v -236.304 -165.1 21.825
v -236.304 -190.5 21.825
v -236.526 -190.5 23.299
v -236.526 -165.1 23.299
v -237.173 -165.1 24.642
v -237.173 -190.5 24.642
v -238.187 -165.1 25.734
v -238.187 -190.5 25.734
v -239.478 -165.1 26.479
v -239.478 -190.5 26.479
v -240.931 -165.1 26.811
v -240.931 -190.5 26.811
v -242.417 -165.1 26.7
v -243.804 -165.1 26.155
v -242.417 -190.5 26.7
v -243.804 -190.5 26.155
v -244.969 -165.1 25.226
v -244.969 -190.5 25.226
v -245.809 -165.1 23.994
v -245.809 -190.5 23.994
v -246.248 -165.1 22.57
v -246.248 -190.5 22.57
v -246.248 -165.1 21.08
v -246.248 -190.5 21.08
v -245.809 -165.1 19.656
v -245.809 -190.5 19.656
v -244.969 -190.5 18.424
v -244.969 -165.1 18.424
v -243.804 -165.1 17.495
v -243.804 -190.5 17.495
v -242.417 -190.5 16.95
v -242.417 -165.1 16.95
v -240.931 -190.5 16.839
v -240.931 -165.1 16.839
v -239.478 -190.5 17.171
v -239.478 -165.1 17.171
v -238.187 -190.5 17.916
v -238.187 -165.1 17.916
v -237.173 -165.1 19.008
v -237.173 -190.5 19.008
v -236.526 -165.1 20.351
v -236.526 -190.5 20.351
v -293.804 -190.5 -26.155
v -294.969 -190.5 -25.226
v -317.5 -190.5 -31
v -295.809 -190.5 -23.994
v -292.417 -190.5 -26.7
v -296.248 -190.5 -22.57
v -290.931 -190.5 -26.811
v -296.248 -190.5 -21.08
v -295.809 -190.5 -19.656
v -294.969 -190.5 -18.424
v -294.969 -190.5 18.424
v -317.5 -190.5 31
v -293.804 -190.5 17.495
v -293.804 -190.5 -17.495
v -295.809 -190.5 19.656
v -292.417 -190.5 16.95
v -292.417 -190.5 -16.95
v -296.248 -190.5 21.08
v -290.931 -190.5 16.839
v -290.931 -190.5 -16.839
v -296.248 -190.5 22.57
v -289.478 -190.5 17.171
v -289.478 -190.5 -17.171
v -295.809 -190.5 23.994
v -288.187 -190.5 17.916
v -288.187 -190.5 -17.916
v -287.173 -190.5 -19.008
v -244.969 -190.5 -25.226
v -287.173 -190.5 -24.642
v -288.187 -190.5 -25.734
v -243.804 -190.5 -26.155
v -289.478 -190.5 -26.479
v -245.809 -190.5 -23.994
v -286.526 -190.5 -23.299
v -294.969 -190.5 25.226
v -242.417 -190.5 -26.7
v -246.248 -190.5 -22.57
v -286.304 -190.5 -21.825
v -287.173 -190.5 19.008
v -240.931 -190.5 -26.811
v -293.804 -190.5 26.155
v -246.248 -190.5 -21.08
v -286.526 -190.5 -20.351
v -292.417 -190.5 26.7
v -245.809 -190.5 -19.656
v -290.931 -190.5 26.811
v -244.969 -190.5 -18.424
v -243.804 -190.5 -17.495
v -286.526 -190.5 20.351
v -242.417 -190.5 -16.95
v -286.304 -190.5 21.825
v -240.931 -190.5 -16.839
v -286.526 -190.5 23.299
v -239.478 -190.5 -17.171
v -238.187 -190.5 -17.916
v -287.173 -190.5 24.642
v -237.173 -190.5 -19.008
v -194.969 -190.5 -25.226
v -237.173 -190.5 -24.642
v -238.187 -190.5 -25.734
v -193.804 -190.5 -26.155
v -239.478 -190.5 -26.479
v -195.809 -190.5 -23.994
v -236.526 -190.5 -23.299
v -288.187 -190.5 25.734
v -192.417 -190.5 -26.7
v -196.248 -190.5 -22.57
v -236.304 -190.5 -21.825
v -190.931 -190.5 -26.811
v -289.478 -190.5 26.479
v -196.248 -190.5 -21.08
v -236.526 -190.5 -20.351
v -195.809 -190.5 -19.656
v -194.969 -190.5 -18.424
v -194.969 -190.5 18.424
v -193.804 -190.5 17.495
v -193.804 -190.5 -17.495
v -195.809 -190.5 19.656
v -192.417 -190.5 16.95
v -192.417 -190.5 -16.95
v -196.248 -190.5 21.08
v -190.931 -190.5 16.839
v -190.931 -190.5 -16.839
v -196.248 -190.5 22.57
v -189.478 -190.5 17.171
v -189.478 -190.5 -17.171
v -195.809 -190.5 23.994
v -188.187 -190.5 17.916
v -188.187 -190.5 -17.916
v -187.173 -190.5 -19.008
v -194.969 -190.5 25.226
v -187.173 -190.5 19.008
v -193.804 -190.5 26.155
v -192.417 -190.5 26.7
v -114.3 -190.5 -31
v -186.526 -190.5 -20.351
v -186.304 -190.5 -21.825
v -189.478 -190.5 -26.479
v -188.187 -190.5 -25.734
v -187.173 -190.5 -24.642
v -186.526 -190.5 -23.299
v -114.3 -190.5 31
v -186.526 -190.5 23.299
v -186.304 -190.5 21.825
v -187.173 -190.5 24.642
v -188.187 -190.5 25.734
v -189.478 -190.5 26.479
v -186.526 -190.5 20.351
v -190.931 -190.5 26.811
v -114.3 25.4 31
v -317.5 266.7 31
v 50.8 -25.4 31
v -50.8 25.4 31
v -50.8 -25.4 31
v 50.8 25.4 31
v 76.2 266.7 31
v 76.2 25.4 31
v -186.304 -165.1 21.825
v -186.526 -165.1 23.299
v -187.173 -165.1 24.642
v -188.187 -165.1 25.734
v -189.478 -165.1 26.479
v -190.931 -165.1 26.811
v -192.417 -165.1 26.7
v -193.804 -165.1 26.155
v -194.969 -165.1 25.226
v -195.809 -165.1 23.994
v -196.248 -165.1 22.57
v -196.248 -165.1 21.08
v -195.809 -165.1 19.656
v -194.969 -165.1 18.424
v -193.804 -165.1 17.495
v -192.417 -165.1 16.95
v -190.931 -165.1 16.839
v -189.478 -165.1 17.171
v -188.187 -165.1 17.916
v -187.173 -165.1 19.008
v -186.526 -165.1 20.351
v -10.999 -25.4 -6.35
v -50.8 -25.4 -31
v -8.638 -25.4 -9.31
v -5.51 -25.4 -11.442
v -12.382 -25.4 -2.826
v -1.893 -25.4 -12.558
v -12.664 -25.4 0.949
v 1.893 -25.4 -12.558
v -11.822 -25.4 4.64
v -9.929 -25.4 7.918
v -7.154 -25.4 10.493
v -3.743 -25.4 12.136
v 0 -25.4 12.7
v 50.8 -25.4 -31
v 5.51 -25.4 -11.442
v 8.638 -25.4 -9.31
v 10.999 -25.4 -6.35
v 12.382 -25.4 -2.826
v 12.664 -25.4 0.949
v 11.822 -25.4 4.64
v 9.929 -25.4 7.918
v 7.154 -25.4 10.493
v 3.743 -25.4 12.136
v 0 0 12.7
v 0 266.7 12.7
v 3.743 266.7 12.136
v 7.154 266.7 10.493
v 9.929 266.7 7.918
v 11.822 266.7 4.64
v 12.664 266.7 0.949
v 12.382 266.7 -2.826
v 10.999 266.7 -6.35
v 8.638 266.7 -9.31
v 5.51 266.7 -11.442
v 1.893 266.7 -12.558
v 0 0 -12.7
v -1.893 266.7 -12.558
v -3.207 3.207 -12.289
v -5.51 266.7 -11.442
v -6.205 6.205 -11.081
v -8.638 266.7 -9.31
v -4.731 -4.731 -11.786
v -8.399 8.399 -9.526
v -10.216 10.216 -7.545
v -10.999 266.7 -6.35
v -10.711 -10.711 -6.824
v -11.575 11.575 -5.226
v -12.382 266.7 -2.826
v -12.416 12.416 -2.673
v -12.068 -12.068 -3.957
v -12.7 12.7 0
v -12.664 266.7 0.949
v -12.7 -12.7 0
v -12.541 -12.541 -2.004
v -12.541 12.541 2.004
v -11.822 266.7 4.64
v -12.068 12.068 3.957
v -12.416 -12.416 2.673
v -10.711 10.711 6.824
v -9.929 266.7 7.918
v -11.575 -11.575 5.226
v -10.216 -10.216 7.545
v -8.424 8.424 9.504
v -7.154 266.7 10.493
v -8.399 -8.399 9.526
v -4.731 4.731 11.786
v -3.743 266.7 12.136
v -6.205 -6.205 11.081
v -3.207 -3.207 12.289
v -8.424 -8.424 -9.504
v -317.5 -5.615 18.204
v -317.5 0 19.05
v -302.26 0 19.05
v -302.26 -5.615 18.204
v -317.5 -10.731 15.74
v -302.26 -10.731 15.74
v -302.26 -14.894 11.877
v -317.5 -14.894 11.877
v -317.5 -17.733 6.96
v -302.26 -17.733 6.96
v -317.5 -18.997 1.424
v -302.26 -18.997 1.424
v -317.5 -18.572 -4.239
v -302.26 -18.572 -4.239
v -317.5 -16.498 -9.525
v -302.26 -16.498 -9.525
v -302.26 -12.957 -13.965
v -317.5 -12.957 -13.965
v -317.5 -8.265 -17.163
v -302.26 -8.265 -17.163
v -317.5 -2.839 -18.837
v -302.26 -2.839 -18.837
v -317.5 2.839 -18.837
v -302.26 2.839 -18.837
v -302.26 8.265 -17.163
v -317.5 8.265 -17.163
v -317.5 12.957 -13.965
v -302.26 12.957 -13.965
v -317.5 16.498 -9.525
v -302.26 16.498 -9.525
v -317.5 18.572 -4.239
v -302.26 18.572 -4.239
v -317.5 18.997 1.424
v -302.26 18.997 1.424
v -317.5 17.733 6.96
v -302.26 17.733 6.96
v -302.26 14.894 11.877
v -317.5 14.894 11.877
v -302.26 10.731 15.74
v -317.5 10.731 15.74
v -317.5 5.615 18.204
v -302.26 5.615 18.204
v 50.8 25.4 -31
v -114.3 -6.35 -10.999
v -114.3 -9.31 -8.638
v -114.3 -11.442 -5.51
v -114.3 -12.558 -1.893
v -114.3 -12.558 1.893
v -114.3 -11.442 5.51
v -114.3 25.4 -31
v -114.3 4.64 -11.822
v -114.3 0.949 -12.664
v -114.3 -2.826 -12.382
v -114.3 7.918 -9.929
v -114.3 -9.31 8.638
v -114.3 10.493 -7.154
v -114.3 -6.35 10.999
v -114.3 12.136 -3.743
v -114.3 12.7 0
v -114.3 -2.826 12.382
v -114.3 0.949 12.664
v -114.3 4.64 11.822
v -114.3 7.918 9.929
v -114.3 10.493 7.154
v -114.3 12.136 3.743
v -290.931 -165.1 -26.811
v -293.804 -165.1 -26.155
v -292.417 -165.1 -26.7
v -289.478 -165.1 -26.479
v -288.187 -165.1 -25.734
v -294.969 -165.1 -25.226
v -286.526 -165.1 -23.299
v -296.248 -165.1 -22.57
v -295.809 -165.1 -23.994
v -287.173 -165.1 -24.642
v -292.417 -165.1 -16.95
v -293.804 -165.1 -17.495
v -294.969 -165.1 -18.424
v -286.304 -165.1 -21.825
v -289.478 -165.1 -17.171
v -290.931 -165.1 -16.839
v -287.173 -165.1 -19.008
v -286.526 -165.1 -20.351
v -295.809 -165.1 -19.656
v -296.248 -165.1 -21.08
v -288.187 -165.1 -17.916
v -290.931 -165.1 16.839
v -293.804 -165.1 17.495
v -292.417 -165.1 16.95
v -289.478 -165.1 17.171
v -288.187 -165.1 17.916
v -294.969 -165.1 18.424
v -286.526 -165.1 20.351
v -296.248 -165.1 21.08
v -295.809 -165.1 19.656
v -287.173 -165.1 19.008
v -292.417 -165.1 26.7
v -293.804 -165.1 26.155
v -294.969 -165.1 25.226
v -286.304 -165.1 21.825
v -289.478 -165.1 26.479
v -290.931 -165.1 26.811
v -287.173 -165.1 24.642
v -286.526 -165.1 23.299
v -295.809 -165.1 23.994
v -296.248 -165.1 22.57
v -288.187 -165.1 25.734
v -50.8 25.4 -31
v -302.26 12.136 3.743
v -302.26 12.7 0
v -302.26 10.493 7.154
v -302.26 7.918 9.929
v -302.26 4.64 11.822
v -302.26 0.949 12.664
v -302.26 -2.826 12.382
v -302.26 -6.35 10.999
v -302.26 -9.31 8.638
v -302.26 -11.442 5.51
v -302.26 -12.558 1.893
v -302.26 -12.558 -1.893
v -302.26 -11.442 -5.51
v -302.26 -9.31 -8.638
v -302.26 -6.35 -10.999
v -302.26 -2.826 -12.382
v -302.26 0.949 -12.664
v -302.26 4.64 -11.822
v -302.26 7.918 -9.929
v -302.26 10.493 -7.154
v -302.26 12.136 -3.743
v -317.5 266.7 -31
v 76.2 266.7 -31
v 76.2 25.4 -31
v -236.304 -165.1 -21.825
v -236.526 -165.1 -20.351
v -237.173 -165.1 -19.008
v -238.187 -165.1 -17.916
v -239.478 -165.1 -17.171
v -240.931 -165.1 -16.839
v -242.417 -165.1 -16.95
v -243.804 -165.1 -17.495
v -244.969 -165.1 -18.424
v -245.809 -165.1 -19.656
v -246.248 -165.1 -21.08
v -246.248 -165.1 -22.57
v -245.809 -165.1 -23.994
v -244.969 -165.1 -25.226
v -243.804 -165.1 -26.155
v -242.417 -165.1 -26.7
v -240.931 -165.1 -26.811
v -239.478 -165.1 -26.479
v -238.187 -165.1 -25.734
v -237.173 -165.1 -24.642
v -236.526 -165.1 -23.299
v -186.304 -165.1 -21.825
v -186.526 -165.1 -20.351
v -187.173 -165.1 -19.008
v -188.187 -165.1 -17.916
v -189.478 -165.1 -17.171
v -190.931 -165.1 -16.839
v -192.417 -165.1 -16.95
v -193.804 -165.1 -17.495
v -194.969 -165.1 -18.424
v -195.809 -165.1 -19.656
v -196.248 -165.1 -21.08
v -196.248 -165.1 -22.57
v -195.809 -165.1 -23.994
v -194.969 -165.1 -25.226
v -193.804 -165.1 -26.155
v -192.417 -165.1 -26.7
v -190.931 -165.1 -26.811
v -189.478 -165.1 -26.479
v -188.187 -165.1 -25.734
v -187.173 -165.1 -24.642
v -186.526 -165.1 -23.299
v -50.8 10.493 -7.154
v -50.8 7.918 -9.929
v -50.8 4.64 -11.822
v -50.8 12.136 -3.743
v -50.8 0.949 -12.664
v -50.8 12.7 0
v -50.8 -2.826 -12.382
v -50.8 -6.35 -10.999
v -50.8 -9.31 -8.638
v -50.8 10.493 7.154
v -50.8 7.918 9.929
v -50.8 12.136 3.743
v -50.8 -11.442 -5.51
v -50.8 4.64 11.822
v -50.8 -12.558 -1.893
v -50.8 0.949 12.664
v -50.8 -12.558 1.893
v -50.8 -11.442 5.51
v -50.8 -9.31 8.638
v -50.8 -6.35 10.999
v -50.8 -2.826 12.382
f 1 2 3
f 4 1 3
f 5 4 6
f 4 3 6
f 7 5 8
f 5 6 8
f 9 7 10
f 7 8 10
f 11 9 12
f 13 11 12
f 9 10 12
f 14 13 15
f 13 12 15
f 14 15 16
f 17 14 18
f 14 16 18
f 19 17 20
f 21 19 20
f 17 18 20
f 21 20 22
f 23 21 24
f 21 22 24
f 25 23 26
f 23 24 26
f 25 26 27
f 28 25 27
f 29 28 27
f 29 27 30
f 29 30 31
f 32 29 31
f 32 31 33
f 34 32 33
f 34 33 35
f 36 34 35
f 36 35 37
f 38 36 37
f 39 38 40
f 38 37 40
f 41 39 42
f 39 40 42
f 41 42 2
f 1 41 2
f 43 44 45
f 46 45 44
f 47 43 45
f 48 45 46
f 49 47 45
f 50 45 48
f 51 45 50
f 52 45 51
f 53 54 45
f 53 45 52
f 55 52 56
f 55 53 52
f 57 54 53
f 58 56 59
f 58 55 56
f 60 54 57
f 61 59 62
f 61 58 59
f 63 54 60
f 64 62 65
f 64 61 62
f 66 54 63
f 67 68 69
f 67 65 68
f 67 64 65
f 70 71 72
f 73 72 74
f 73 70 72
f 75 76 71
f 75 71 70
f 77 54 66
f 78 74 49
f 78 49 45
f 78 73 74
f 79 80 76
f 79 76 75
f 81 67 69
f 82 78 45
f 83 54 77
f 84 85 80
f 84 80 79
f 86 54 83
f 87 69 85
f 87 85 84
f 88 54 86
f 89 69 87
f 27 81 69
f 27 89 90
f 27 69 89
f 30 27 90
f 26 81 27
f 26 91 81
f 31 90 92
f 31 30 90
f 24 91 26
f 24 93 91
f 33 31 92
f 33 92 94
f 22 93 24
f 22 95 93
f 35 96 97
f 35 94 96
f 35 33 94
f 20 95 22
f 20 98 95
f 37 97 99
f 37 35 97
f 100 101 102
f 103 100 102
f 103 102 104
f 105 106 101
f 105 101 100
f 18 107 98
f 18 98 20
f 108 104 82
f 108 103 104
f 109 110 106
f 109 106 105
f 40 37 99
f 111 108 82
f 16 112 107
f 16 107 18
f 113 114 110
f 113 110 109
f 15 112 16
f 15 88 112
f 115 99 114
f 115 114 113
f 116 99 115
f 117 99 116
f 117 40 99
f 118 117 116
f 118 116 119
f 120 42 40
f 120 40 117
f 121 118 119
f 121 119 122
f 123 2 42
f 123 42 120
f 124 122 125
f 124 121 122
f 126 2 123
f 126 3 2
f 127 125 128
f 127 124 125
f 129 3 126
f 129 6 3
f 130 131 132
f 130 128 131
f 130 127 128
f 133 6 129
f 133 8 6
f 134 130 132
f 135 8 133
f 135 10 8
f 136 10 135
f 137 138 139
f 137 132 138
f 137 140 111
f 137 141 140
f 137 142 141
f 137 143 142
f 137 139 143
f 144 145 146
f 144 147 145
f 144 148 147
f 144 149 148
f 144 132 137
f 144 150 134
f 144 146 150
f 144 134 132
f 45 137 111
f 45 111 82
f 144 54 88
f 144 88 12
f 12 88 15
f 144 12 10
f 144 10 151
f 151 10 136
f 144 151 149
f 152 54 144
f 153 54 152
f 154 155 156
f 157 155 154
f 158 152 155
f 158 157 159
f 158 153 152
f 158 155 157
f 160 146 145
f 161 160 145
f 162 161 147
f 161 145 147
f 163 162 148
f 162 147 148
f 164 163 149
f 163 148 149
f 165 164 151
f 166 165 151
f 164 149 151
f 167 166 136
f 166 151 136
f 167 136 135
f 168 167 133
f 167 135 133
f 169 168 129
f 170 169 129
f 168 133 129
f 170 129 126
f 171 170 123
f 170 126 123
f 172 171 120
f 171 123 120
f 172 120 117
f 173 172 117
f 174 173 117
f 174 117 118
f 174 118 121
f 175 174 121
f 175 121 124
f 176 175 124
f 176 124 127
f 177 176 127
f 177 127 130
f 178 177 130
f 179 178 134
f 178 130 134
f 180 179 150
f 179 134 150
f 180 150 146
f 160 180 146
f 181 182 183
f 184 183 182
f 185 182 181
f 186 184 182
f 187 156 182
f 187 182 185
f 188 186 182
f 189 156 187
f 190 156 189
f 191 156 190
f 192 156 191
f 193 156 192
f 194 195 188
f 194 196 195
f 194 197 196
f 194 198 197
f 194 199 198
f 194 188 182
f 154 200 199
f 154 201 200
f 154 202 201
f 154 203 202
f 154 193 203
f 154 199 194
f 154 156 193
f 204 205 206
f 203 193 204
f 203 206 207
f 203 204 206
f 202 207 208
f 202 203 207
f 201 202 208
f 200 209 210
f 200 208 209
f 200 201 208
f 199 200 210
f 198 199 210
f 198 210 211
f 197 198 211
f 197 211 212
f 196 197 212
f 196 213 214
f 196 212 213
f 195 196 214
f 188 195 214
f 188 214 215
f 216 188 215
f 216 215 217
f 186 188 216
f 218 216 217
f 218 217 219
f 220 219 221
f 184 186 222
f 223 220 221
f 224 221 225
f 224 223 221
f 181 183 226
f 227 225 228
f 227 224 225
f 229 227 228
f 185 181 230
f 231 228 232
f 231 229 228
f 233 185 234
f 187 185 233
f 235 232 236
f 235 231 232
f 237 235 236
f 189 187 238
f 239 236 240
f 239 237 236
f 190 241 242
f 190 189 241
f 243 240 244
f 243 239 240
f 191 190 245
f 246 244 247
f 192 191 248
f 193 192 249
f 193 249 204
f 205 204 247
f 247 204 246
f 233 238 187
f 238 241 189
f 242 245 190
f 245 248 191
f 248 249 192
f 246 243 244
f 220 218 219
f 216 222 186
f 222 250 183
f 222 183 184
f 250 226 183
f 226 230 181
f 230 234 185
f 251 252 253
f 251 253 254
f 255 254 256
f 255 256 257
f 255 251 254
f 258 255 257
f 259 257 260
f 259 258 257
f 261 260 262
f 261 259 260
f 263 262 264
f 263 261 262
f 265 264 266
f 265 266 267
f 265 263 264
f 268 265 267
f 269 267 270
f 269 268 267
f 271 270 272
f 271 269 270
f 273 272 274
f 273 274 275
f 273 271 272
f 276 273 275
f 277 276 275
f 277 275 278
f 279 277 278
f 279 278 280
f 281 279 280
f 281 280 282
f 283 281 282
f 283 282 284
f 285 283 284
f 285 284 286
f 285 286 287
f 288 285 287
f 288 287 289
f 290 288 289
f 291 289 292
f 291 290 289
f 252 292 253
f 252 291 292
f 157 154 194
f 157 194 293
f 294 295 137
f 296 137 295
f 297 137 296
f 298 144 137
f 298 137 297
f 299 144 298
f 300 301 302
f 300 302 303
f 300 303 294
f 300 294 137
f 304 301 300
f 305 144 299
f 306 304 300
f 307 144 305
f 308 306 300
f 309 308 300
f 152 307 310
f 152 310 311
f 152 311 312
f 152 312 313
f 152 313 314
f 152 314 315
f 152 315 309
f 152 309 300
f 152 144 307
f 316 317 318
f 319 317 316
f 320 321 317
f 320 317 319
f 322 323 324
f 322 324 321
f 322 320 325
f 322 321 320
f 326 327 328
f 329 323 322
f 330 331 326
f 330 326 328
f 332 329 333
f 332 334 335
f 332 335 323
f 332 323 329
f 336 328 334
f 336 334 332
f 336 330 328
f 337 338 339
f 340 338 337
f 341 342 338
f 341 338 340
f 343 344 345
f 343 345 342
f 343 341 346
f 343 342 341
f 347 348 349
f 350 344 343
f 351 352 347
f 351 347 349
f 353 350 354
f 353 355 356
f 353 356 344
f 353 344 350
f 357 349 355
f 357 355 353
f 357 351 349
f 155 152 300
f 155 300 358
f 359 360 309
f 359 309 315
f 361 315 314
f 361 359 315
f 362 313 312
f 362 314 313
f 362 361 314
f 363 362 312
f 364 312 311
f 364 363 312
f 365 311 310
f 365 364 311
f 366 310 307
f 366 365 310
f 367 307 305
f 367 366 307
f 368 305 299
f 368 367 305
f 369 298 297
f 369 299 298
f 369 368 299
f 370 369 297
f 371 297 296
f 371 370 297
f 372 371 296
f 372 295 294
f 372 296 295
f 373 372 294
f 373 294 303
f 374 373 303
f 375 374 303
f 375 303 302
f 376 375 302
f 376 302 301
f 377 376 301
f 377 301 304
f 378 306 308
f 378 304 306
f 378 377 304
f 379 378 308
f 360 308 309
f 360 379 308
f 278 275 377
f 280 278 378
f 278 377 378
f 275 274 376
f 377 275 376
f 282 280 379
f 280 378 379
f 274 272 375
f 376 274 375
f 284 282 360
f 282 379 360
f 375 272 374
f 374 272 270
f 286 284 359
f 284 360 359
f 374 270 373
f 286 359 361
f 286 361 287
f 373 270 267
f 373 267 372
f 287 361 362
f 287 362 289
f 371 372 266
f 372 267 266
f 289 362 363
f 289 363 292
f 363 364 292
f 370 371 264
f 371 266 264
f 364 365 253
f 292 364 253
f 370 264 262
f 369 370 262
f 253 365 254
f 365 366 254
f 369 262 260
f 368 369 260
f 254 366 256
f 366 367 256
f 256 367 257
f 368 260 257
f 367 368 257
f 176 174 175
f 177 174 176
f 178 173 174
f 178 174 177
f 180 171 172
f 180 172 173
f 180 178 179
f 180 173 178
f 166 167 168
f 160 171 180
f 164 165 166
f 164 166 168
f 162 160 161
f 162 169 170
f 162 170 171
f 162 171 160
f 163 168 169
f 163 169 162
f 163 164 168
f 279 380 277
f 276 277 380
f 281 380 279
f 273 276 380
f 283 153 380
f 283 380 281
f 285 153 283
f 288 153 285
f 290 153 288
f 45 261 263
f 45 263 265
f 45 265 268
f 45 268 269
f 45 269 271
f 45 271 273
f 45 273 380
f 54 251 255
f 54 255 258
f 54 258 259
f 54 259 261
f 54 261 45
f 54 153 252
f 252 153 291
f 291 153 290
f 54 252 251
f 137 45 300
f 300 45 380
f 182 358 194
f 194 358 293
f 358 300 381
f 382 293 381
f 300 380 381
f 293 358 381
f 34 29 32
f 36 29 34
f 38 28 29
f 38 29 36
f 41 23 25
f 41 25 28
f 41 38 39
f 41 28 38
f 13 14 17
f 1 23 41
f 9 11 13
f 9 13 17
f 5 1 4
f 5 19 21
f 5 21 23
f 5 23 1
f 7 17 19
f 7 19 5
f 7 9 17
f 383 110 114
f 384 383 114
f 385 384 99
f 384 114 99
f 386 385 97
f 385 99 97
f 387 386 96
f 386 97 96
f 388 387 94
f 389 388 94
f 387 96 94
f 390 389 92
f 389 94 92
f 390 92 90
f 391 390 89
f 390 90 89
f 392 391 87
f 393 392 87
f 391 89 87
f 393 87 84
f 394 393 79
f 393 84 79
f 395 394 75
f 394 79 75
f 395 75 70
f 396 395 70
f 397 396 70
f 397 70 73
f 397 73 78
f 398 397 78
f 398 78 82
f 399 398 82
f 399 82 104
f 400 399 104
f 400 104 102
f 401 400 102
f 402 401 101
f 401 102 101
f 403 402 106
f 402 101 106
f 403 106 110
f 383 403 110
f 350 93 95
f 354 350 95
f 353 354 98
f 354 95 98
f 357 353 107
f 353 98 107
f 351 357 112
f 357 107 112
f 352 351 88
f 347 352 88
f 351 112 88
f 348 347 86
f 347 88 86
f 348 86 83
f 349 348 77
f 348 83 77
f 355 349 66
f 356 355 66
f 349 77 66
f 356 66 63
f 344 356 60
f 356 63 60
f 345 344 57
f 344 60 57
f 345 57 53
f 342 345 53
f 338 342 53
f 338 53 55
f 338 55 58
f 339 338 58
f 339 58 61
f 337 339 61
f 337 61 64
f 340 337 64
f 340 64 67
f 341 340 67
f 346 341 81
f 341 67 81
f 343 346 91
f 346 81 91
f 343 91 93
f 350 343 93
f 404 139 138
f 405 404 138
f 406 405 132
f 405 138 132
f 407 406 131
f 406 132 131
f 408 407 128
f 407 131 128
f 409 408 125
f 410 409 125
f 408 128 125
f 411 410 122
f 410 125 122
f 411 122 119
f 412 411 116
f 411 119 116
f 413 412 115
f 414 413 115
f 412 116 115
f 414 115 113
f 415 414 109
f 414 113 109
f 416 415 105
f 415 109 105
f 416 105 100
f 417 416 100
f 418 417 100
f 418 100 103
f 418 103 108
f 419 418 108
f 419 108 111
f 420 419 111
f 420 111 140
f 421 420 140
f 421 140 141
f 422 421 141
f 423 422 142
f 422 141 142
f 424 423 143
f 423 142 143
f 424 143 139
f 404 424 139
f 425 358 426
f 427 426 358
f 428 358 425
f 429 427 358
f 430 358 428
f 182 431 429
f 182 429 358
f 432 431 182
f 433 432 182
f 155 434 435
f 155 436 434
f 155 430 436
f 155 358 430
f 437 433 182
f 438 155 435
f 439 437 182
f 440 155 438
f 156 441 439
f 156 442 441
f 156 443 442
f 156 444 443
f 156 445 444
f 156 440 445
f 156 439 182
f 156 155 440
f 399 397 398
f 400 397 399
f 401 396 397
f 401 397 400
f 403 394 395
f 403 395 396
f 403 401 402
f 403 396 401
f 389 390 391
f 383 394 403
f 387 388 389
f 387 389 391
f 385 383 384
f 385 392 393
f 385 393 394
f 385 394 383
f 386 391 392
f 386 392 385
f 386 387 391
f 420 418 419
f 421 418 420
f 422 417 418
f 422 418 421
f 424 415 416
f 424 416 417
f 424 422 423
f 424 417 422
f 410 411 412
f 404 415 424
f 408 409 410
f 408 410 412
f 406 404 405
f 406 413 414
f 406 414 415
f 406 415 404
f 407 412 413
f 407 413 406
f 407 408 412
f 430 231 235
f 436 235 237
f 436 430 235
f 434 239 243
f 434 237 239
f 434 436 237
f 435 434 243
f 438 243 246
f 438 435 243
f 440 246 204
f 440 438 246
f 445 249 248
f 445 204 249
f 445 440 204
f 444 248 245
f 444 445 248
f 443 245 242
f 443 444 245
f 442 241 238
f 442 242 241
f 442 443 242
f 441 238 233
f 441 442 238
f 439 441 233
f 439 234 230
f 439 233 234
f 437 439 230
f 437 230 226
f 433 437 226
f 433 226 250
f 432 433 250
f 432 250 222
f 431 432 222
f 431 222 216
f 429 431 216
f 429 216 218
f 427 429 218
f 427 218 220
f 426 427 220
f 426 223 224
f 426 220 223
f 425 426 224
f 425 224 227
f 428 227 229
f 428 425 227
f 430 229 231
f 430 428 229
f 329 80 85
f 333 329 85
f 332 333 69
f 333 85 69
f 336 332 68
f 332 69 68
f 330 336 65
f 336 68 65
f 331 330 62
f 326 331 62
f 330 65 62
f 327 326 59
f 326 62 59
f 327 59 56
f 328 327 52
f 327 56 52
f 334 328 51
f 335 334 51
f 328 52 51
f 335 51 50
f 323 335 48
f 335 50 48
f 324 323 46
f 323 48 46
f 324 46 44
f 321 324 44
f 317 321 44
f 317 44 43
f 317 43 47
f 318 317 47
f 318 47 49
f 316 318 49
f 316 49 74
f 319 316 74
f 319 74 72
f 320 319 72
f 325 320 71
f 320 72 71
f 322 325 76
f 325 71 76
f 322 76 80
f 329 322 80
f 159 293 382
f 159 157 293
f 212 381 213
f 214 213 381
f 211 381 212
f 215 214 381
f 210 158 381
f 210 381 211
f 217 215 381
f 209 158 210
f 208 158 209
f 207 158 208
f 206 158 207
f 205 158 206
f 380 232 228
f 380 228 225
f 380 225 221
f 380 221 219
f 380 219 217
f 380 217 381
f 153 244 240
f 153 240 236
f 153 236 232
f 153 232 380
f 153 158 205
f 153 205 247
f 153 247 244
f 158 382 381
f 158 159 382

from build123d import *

# Parameters (mm, degrees)
BOSS_EXTRUDE3_DEPTH     = 31
SKETCH2_R               = 12.7
CUT_EXTRUDE1_DEPTH      = 317.5
CUT_EXTRUDE3_DEPTH      = 416.807816184
CUT_EXTRUDE3_DEPTH_BACK = 416.807816184
SKETCH6_R               = 12.7
SKETCH3_R               = 19.05
CUT_EXTRUDE4_DEPTH      = 15.24
SKETCH7_R               = 5
CUT_EXTRUDE5_DEPTH      = 25.4


with BuildPart() as part:
    # Sketch5 → Boss-Extrude3 (new, symmetric)
    with BuildSketch(Plane.XY):
        Polygon((76.2, 266.7), (-317.5, 266.7), (-317.5, -190.5), (-114.3, -190.5), (-114.3, 25.4), (-50.8, 25.4), (-50.8, -25.4), (50.8, -25.4), (50.8, 25.4), (76.2, 25.4), align=None)
    extrude(amount=BOSS_EXTRUDE3_DEPTH, both=True)

    # Sketch2 → Cut-Extrude1 (cut)
    with BuildSketch(Plane(origin=(-317.5, 0, -457.2), x_dir=(0, 0, -1), z_dir=(1, 0, 0))):
        with Locations(Location((-457.2, 0, 0), (0, 0, 90))):
            Circle(SKETCH2_R)
    extrude(amount=CUT_EXTRUDE1_DEPTH, mode=Mode.SUBTRACT)

    # Sketch6 → Cut-Extrude3 (cut, two sides: drawn at the far end of the back side and taken through both)
    with BuildSketch(Plane(origin=(0, 0, 0), x_dir=(1, 0, 0), z_dir=(0, 1, 0)).offset(-CUT_EXTRUDE3_DEPTH_BACK)):
        with Locations(Location((0, 0, 0), (0, 0, 270))):
            Circle(SKETCH6_R)
    extrude(amount=CUT_EXTRUDE3_DEPTH + CUT_EXTRUDE3_DEPTH_BACK, mode=Mode.SUBTRACT)

    # Sketch3 → Cut-Extrude4 (cut)
    with BuildSketch(Plane(origin=(-317.5, 0, -457.2), x_dir=(0, 0, -1), z_dir=(1, 0, 0))):
        with Locations(Location((-457.2, 0, 0), (0, 0, 180))):
            Circle(SKETCH3_R)
    extrude(amount=CUT_EXTRUDE4_DEPTH, mode=Mode.SUBTRACT)

    # Sketch7 → Cut-Extrude5 (cut)
    with BuildSketch(Plane.XZ.offset(190.5)):
        with Locations((-291.304206057, 21.825)):
            Circle(SKETCH7_R)
        with Locations((-291.304206057, -21.825)):
            Circle(SKETCH7_R)
        with Locations((-241.304206057, 21.825)):
            Circle(SKETCH7_R)
        with Locations((-241.304206057, -21.825)):
            Circle(SKETCH7_R)
        with Locations((-191.304206057, 21.825)):
            Circle(SKETCH7_R)
        with Locations((-191.304206057, -21.825)):
            Circle(SKETCH7_R)
    extrude(amount=-CUT_EXTRUDE5_DEPTH, mode=Mode.SUBTRACT)


solid = part.part
